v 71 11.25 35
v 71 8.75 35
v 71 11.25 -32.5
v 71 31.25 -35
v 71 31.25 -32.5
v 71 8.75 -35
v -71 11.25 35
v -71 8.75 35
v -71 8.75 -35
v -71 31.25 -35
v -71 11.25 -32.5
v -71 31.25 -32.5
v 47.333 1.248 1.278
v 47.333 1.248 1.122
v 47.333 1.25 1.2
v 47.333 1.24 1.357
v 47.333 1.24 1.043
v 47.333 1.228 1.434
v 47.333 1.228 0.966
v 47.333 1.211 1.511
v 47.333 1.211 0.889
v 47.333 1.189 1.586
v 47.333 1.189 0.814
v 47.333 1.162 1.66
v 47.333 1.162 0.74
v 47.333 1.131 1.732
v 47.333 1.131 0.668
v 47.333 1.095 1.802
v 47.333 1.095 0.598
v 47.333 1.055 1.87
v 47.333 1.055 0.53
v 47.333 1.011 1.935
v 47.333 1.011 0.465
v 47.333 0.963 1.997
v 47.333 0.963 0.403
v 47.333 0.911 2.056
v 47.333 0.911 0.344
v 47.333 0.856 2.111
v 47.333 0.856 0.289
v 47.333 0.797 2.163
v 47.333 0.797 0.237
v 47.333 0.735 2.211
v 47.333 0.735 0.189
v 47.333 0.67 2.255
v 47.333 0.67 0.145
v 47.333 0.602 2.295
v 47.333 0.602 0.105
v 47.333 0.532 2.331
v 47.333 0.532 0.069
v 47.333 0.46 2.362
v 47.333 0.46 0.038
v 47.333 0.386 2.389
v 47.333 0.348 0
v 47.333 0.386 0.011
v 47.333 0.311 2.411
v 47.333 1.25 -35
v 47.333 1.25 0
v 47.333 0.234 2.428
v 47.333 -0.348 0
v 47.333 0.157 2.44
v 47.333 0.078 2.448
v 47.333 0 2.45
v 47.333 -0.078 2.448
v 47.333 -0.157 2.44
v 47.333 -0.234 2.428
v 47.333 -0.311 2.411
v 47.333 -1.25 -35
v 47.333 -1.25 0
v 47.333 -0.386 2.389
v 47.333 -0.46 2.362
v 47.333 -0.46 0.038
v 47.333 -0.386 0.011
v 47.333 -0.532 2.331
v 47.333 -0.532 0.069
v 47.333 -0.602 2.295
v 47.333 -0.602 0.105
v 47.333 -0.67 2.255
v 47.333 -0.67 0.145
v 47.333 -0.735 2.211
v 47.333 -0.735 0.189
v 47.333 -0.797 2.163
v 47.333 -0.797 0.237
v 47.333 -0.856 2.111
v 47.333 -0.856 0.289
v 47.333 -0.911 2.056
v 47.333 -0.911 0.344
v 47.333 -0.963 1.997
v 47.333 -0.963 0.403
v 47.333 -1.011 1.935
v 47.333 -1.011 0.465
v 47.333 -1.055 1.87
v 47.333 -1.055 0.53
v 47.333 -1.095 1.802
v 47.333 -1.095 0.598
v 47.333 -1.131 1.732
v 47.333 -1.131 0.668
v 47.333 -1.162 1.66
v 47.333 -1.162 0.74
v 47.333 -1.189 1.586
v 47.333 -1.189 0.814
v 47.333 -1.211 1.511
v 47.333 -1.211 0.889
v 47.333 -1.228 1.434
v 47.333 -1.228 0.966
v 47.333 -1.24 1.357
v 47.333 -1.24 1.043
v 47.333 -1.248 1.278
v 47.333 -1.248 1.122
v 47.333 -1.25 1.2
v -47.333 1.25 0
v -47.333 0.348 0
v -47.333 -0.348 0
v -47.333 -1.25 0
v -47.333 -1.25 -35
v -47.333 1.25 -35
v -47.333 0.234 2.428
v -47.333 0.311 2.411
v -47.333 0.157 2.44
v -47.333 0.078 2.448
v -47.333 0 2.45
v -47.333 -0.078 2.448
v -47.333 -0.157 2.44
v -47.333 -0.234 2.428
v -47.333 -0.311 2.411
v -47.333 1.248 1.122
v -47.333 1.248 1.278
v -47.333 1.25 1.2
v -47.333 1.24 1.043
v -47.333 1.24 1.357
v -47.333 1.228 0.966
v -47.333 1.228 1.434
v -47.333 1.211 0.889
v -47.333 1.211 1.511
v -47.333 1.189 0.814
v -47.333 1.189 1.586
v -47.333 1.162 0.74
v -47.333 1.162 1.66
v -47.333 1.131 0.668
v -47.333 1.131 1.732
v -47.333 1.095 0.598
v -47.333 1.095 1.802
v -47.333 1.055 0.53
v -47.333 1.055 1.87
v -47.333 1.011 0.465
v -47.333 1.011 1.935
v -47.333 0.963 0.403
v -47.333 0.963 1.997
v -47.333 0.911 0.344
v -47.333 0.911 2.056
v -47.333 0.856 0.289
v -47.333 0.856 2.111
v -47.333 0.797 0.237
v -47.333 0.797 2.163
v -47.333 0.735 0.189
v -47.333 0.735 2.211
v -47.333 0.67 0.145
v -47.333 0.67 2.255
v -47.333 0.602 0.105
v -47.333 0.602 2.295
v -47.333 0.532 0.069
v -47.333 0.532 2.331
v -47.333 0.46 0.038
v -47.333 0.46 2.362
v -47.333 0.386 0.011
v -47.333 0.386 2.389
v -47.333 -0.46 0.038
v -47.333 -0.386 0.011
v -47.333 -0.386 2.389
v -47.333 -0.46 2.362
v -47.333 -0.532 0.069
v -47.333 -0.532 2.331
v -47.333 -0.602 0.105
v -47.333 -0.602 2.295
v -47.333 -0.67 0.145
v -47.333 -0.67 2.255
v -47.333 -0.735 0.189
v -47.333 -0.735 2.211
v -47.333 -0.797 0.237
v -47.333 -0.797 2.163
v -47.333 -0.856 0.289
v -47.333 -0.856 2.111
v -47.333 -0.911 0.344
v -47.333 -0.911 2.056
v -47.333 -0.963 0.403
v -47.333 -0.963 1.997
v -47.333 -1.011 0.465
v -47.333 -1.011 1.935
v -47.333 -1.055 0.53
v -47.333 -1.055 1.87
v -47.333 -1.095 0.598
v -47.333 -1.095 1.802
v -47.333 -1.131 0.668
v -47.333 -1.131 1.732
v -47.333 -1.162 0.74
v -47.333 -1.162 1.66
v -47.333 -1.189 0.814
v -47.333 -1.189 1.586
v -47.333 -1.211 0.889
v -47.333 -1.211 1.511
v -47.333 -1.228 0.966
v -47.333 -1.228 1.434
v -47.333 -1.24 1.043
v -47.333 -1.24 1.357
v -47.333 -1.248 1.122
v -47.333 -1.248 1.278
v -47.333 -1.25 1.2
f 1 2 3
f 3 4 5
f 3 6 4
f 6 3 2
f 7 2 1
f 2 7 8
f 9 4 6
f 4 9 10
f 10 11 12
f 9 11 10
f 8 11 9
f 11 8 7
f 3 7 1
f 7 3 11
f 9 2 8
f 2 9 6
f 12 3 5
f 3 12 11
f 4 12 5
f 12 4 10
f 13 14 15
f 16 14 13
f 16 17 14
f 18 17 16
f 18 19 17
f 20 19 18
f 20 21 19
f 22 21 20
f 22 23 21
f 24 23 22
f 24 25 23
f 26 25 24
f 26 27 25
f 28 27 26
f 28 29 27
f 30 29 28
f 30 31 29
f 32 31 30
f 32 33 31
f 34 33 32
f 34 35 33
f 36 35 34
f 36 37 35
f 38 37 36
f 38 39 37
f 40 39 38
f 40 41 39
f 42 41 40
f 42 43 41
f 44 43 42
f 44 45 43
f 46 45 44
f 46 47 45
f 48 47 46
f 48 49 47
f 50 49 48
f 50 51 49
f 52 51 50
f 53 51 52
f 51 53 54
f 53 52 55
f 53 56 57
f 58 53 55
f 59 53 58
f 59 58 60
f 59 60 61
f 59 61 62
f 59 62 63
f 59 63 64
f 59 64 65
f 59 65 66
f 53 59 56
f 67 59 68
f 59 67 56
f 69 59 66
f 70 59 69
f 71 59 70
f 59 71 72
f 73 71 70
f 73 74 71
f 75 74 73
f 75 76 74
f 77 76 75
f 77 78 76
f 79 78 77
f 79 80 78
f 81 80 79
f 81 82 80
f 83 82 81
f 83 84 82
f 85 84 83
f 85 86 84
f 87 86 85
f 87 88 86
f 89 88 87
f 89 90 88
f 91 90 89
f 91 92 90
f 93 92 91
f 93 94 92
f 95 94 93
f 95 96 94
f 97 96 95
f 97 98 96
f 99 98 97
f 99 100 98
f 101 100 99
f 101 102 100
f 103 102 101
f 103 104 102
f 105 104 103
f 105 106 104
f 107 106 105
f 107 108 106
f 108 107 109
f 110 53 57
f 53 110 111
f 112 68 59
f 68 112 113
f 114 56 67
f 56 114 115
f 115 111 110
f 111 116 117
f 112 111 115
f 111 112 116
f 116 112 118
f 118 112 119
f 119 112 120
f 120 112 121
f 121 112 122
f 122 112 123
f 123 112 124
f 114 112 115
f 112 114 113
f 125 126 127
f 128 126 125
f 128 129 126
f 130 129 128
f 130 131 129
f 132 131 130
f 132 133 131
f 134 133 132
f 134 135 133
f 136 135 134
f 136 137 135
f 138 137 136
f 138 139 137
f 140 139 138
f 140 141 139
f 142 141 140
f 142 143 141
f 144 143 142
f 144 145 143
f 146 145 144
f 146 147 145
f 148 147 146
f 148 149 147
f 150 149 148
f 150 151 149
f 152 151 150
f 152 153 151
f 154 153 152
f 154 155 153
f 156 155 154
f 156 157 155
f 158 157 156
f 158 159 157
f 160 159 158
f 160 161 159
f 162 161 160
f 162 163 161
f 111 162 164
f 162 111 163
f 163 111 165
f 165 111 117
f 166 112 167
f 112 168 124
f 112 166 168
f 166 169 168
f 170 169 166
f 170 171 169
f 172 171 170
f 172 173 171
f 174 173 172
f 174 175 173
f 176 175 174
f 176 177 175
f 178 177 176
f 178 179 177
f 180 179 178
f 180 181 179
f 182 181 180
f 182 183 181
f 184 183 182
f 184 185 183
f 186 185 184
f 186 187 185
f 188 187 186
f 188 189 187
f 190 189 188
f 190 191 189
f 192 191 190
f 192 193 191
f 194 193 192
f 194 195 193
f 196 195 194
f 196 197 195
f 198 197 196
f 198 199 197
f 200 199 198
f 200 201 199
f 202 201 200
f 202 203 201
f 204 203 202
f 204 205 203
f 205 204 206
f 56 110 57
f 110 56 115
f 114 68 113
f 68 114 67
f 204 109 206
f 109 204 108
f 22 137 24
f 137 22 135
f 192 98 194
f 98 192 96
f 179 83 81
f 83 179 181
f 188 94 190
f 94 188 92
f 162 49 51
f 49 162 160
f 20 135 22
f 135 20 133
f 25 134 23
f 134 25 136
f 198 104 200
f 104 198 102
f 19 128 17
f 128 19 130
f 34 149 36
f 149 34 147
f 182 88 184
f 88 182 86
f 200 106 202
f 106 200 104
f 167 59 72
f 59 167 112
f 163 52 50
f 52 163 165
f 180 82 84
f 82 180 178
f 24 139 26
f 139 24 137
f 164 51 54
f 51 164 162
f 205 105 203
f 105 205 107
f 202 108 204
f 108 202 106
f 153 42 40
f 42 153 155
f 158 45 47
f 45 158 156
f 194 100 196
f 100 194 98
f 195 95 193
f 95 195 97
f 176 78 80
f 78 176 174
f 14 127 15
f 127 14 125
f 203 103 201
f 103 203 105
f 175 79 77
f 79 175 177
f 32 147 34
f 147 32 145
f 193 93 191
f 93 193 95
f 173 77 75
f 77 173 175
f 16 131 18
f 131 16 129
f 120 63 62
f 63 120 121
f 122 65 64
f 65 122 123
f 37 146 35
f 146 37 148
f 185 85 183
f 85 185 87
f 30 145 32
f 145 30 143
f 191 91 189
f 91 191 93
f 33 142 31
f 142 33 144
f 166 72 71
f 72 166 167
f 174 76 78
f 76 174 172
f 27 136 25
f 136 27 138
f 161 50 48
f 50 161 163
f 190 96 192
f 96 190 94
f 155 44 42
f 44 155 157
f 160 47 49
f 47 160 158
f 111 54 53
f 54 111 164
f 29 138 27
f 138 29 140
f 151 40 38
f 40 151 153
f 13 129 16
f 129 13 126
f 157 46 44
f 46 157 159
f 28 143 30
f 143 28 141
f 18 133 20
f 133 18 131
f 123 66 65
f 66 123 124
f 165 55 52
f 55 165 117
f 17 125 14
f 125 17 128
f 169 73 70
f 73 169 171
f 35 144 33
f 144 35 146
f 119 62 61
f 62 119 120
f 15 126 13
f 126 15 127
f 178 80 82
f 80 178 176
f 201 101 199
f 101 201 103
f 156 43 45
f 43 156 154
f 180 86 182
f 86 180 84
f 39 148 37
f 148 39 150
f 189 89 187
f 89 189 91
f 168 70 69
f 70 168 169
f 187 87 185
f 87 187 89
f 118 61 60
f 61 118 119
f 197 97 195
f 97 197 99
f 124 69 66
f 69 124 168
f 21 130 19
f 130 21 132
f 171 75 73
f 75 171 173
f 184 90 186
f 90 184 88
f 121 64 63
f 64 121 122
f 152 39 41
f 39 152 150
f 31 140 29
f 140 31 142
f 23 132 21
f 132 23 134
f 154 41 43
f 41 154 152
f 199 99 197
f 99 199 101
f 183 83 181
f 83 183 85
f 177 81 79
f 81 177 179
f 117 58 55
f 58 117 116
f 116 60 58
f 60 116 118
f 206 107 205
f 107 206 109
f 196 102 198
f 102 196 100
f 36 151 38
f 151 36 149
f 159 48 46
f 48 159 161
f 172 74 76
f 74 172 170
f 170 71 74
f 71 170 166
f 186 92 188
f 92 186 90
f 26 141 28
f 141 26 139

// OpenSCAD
// Retroid Pocket 2 Stand ⓒ Lee Fallat 2021
$fn = 100;

stand_thickness = 2.5;
stand_width = 142;
stand_height = 70;

stand_lip_length = 20;

kick_width = stand_width / 1.5;
kick_bottom_height = stand_height / 2.0;

// Allows many shapes to barely touch
epsilon = 0.05;

module capsule(height, thickness) {
    cylinder(height, thickness, thickness, center = true);
    translate([0, 0, height / 2.0])
        sphere(thickness);
    translate([0, 0, height / -2.0])
        sphere(thickness);
}



module face() {
    union() {
        // The front face of the stand
        cube([stand_width, stand_thickness, stand_height], center = true);
        
        // The foot of the stand
        translate([
            0,
            (stand_lip_length / 2.0) + (stand_thickness / 2.0),
               (stand_height / -2.0) + (stand_thickness / 2.0)
        ])
        cube([stand_width, stand_lip_length, stand_thickness], center = true);
    }
}

module kick_bottom() {
    difference() {
        union() {
            translate([0, 0, kick_bottom_height / -2.0])
                cube([kick_width, stand_thickness, stand_height / 2.0], center = true);

            translate([0, 0, (stand_thickness / 2.0) - epsilon])
            rotate([0, 90, 0])
                cylinder(kick_width, stand_thickness / 2.0, stand_thickness / 2.0, center = true);
        }
        
        for(a = [0 : 1 : 4]) {
            
        }
    }
}

module kick() {
    kick_bottom();
}

module stand() {
    translate([0, 10, 0])
        face();
    kick();
}

stand();
